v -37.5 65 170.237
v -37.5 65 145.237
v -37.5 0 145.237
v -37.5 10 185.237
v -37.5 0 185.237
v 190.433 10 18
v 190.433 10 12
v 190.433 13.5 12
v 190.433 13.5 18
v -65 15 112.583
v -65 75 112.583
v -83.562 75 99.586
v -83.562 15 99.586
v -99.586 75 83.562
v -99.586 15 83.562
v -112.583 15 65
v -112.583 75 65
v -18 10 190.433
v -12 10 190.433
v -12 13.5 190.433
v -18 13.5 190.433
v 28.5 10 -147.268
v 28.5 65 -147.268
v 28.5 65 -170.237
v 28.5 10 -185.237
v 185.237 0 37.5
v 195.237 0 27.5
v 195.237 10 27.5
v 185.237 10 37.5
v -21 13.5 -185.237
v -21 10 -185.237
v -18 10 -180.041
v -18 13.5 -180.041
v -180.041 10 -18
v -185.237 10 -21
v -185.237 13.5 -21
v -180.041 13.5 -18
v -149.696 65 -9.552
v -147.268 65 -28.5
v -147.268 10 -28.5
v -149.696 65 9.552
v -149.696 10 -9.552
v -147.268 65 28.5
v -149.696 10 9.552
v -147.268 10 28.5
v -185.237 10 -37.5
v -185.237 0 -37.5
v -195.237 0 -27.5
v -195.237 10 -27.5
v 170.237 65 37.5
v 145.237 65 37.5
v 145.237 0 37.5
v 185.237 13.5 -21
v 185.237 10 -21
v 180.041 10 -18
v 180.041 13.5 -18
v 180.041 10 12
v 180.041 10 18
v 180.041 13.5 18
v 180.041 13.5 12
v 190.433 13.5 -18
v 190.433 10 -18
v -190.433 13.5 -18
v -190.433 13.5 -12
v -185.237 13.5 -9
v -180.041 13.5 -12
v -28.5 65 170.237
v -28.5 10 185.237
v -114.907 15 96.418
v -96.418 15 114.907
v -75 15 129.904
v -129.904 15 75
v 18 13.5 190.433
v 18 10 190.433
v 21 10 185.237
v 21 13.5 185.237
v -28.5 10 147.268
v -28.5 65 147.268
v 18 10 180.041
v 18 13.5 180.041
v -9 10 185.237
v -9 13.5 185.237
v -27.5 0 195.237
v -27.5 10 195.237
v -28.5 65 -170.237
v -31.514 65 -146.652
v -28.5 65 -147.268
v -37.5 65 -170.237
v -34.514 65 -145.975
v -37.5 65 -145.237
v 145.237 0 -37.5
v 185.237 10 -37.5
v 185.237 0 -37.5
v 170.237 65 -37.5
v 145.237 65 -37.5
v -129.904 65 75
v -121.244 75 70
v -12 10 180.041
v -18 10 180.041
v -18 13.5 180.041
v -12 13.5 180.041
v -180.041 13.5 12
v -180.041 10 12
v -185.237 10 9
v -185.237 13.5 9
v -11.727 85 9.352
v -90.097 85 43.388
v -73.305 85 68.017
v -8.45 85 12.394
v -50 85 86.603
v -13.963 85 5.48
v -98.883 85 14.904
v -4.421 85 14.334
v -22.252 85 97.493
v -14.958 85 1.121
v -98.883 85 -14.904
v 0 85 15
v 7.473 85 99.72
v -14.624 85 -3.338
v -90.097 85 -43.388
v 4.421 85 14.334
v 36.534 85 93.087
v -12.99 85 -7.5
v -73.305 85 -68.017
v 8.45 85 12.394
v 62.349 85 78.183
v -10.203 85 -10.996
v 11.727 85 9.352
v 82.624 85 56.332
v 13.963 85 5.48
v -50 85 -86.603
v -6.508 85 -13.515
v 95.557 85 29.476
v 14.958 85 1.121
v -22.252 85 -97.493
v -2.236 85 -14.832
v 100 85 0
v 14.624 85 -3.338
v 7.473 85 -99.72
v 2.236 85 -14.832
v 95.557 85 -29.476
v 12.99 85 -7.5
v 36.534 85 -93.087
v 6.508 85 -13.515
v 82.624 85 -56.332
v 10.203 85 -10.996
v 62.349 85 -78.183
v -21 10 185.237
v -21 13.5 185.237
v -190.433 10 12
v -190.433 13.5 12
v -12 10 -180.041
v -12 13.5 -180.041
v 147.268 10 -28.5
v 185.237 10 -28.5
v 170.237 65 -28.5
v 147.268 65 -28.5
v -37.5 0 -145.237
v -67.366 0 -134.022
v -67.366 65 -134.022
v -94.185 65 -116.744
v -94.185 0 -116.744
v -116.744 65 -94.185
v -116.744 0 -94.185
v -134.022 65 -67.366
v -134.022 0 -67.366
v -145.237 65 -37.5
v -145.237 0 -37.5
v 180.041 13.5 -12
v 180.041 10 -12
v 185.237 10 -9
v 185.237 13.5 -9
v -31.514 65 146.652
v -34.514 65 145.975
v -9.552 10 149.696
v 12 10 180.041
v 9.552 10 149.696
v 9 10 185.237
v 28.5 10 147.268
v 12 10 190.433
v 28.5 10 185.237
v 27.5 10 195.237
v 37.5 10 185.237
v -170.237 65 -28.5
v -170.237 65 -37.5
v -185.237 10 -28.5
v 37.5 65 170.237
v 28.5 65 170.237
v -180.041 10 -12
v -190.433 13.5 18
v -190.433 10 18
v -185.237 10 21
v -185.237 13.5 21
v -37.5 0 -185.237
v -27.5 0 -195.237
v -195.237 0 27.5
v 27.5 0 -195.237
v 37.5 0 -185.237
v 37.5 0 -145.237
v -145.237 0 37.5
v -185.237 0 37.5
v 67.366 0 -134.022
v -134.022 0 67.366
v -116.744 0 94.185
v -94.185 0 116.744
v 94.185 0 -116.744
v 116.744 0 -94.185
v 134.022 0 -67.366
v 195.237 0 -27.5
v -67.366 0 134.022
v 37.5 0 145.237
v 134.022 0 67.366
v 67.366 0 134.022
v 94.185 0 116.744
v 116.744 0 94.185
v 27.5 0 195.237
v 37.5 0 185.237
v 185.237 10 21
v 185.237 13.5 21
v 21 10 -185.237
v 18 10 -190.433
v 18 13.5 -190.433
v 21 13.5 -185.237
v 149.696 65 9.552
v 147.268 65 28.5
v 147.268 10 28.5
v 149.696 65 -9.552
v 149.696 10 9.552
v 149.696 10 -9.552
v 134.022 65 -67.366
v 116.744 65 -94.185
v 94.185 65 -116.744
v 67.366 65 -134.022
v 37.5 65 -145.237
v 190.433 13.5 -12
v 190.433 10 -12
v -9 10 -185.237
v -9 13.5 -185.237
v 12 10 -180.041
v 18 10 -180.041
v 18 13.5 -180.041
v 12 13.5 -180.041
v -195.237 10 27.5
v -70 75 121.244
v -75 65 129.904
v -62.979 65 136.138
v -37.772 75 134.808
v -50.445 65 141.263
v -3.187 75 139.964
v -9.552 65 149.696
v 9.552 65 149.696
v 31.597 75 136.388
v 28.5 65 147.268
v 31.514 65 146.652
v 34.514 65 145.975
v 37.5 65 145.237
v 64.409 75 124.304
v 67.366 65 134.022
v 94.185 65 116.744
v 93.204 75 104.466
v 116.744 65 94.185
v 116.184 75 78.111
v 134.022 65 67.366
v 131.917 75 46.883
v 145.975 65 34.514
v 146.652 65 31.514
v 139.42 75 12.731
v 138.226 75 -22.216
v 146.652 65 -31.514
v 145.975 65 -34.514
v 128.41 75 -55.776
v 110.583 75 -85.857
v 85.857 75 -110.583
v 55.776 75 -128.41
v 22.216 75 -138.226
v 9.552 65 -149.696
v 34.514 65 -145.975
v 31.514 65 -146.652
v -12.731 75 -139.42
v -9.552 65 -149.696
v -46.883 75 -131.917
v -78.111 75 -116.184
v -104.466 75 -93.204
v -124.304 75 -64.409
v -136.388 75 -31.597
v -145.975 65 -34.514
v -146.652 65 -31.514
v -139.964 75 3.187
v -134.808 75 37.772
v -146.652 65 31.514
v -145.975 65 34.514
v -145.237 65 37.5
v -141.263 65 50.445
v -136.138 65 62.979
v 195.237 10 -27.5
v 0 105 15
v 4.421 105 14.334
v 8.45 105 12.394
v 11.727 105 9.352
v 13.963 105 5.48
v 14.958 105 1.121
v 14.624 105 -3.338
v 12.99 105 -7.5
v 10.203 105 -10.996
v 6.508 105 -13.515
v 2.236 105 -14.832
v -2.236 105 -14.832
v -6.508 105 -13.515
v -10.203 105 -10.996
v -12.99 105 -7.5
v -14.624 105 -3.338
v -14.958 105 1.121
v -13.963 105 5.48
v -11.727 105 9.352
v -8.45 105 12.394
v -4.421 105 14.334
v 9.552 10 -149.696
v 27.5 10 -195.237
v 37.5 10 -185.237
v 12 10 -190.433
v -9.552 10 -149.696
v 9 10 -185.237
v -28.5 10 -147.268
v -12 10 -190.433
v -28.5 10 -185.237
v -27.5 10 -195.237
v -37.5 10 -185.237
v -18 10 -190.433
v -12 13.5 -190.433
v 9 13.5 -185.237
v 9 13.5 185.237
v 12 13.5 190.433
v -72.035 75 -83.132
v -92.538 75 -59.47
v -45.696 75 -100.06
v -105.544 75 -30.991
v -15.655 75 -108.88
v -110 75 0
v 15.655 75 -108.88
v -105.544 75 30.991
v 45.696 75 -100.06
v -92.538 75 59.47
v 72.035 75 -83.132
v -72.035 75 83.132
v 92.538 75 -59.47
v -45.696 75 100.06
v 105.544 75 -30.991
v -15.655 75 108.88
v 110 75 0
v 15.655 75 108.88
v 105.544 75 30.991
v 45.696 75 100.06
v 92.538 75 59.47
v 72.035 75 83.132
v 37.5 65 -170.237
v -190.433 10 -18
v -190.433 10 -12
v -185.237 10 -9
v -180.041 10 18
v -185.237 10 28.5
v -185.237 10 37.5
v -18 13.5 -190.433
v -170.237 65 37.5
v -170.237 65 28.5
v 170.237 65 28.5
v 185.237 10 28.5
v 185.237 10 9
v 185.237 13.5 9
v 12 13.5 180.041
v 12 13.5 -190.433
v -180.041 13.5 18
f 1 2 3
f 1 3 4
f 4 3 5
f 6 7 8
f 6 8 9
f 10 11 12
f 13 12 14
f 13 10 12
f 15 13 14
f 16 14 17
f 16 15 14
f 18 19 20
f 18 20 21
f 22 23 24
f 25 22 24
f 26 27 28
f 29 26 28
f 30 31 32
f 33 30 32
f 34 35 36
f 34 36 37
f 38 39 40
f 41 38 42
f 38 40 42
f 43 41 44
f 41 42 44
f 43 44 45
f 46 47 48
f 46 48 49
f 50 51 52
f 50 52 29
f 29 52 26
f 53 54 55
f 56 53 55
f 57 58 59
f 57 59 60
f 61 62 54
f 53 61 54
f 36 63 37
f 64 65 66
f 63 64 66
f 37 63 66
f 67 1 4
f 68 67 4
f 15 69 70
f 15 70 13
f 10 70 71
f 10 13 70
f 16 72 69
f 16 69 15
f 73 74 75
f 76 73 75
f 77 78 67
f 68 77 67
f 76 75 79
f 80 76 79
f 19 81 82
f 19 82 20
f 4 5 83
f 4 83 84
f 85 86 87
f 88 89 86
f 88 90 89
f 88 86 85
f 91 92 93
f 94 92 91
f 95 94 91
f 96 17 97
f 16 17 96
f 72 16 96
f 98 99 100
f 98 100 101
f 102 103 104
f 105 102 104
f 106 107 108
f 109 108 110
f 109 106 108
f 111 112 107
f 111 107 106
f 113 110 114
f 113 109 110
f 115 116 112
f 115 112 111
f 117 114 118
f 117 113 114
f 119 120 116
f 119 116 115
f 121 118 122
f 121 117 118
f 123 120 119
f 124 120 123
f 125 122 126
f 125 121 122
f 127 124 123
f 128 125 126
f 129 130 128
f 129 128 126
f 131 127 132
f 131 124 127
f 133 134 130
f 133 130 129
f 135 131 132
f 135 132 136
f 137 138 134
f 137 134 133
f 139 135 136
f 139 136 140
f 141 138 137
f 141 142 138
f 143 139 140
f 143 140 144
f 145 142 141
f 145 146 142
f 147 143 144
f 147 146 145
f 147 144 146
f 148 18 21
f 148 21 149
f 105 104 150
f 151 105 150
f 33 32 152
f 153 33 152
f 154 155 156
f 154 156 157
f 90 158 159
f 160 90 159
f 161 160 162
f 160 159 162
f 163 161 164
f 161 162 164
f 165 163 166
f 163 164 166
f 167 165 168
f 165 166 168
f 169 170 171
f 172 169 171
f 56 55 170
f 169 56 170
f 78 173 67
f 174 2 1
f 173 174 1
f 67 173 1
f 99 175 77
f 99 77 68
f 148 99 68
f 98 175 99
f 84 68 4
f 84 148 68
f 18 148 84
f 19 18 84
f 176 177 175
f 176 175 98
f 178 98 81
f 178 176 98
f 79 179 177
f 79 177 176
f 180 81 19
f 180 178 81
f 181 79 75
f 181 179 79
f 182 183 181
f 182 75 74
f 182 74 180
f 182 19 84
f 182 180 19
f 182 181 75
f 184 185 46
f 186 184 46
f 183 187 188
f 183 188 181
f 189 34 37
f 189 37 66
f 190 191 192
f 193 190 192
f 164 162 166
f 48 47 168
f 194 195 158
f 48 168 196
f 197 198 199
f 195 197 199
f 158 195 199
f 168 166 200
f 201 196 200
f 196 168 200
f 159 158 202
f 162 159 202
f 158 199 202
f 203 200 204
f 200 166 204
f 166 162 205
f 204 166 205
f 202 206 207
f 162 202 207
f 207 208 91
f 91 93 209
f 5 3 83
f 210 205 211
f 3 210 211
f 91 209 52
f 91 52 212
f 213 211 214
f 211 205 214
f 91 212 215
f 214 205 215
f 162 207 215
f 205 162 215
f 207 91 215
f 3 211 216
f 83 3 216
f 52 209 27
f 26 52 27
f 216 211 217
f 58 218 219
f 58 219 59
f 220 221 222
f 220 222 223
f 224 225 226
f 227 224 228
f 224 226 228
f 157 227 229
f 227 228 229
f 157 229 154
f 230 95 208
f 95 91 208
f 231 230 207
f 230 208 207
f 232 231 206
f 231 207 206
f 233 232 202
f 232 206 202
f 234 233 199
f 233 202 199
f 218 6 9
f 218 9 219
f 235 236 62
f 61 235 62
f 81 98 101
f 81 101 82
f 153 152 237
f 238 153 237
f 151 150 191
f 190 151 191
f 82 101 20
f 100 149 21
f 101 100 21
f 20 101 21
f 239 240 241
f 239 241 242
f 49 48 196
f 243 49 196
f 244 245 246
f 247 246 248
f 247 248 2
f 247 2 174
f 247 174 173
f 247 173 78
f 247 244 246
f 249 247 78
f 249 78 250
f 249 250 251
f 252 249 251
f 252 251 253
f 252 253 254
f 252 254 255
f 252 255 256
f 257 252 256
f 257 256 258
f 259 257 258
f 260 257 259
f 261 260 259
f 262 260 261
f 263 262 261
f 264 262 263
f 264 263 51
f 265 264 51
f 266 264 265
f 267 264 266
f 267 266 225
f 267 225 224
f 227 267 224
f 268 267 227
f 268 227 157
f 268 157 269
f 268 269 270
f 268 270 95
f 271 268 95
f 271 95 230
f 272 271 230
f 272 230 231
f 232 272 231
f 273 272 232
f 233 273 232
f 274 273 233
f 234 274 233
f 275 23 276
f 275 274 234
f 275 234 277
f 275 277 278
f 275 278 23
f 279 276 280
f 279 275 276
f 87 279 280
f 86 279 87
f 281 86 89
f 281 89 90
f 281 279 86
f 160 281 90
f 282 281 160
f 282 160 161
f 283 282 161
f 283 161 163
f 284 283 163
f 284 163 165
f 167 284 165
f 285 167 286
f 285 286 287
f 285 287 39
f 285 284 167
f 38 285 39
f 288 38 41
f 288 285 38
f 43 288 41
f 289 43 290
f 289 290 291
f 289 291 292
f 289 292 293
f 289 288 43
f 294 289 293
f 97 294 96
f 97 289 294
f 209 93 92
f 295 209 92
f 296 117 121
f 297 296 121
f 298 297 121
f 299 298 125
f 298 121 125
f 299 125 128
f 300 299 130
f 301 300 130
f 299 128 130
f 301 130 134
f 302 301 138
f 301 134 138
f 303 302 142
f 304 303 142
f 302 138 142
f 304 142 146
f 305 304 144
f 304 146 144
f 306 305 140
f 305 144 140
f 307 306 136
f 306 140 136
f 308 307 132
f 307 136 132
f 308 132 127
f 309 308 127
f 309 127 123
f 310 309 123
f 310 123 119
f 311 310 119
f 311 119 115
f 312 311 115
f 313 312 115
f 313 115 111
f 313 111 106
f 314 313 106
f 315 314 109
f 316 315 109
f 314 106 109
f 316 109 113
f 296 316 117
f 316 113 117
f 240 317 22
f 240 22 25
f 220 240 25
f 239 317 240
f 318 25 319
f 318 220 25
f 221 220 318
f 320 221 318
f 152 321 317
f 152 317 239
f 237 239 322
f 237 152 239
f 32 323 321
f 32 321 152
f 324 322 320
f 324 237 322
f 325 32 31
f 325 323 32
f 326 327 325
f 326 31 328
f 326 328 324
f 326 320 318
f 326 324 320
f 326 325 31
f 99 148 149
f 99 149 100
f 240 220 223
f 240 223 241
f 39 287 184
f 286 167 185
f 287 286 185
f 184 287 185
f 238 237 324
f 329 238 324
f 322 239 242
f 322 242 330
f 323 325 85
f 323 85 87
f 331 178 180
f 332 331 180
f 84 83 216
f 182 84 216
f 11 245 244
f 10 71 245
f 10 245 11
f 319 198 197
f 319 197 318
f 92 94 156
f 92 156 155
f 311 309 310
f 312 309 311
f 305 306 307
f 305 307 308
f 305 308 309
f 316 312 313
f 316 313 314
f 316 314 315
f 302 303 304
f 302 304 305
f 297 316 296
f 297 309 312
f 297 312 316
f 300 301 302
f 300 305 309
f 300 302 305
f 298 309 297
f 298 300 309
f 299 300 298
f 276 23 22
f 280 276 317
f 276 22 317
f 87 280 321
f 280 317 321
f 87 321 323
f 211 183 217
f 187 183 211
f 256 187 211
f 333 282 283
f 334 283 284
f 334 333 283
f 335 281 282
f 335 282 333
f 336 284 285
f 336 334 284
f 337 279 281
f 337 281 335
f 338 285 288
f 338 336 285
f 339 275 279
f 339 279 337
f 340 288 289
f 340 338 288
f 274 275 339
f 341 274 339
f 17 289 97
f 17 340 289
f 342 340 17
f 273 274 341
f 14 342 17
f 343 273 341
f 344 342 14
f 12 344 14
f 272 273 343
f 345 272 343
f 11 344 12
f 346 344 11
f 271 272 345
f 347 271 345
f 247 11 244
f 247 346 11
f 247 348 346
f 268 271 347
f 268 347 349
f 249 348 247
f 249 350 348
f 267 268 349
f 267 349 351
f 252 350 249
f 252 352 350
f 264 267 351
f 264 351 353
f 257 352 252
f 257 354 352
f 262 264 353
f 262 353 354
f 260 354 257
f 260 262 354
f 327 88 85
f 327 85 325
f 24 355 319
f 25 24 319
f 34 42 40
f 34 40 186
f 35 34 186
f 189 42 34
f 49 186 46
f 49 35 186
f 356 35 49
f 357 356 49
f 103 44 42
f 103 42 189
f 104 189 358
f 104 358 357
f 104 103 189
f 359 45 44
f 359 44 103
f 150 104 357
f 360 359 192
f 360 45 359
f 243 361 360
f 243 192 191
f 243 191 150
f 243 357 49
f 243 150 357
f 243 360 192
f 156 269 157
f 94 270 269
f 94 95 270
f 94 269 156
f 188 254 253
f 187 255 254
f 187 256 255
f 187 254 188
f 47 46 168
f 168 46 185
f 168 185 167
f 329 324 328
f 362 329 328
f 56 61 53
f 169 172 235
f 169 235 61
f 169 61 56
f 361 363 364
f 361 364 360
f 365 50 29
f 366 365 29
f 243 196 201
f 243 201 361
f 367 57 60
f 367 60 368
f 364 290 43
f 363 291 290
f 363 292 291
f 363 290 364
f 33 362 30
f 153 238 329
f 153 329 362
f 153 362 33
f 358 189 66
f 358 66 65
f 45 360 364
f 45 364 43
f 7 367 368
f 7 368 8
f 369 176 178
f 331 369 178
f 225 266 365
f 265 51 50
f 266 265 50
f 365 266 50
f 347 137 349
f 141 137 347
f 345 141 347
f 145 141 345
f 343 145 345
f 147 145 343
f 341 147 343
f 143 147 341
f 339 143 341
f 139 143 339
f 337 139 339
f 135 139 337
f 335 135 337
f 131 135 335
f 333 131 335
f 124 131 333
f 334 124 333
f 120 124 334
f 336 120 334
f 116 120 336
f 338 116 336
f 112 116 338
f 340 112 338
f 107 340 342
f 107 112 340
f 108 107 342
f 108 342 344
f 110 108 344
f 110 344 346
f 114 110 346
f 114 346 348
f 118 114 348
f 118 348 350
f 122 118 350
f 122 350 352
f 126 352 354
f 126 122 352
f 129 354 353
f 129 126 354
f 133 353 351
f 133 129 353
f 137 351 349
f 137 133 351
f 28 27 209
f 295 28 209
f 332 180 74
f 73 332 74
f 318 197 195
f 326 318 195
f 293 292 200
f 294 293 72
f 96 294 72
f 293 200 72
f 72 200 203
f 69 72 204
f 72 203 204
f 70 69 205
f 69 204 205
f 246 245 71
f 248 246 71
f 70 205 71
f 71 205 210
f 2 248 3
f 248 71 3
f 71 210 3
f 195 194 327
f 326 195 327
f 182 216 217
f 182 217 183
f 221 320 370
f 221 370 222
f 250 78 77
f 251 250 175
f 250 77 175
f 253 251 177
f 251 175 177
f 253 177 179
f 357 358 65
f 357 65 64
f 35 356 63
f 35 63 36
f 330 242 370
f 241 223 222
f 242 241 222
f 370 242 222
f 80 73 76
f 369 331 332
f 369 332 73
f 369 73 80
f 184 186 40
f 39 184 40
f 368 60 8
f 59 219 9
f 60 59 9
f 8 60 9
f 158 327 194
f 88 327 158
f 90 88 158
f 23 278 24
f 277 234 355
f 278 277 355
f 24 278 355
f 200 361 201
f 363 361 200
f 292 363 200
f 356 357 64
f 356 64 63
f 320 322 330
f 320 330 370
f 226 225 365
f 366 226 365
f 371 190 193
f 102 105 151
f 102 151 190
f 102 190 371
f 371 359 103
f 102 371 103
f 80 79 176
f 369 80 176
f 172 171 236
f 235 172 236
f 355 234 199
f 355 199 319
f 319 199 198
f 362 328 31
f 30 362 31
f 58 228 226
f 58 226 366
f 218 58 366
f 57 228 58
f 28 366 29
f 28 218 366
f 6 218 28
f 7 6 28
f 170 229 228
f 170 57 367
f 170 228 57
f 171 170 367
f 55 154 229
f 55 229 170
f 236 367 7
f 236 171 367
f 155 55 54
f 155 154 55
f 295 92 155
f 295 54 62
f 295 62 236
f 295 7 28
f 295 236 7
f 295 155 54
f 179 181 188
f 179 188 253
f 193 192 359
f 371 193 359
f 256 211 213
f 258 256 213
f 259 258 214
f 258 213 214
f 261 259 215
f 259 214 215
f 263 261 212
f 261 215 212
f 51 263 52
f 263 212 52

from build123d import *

# Parameters (mm, degrees)
SKETCH1_R                    = 150
BOSS_EXTRUDE1_DEPTH          = 75
CHAMFER1_SIZE                = 10
BOSS_EXTRUDE2_START          = -75
SKETCH2_R                    = 150
BOSS_EXTRUDE2_DEPTH          = 10
CHAMFER2_SIZE                = 10
CHAMFER3_SIZE                = 10
BOSS_EXTRUDE3_DEPTH          = 9
BOSS_EXTRUDE4_DEPTH          = 3.5
CIRPATTERN1_COUNT            = 4
CIRPATTERN1_COPY_1_DEPTH     = 9
CIRPATTERN1_COPY_2_DEPTH     = 9
CIRPATTERN1_COPY_3_DEPTH     = 9
CIRPATTERN1_COPY_4_DEPTH     = 3.5
CIRPATTERN1_COPY_5_DEPTH     = 3.5
CIRPATTERN1_COPY_6_DEPTH     = 3.5
CHAMFER2_OF_CIRPATTERN1_SIZE = 10
CHAMFER3_OF_CIRPATTERN1_SIZE = 10
CUT_EXTRUDE1_START           = -60
CUT_EXTRUDE1_DEPTH           = 60
SKETCH7_R                    = 110
BOSS_EXTRUDE5_DEPTH          = 10
BOSS_EXTRUDE5_TAPER          = 45
SKETCH8_R                    = 15
BOSS_EXTRUDE6_DEPTH          = 20


with BuildPart() as part:
    # Sketch1 → Boss-Extrude1 (new body)
    with BuildSketch(Plane(origin=(0, 0, 0), x_dir=(1, 0, 0), z_dir=(0, 1, 0))):
        with Locations(Location((0, 0, 0), (0, 0, 270))):
            Circle(SKETCH1_R)
    extrude(amount=BOSS_EXTRUDE1_DEPTH)

    # Chamfer1
    chamfer1_edges = [part.edges().sort_by_distance(p)[0] for p in [
        (0, 75, -150),
    ]]
    chamfer(chamfer1_edges, length=CHAMFER1_SIZE)

    # Sketch2 → Boss-Extrude2 (add)
    with BuildSketch(Plane(origin=(0, 75, 0), x_dir=(1, 0, 0), z_dir=(0, 1, 0)).offset(BOSS_EXTRUDE2_START)):
        with Locations(Location((0, 0, 0), (0, 0, 165.522487814))):
            Circle(SKETCH2_R)
        with BuildLine():
            Line((-145.236875483, 37.5), (-195.236875483, 37.5))
            Line((-195.236875483, 37.5), (-195.236875483, -37.5))
            Line((-195.236875483, -37.5), (-145.236875483, -37.5))
            ThreePointArc((-145.236875483, -37.5), (-150, 0), (-145.236875483, 37.5))
        make_face()
    boss_extrude2 = extrude(amount=BOSS_EXTRUDE2_DEPTH)

    # Chamfer2
    chamfer2_edges = [part.edges().sort_by_distance(p)[0] for p in [
        (-195.236875483, 5, 37.5),
    ]]
    chamfer(chamfer2_edges, length=CHAMFER2_SIZE)

    # Chamfer3
    chamfer3_edges = [part.edges().sort_by_distance(p)[0] for p in [
        (-195.236875483, 5, -37.5),
    ]]
    chamfer(chamfer3_edges, length=CHAMFER3_SIZE)

    # Sketch3 → Boss-Extrude3 (add)
    with BuildSketch(Plane.XY.offset(37.5)):
        Polygon((-185.236875483, 10), (-145.236875483, 10), (-145.236875483, 65), (-170.236875483, 65), align=None)
    boss_extrude3 = extrude(amount=-BOSS_EXTRUDE3_DEPTH)

    # Sketch4 → Boss-Extrude4 (add)
    with BuildSketch(Plane(origin=(0, 10, 0), x_dir=(1, 0, 0), z_dir=(0, 1, 0))):
        Polygon((-180.04072306, -12), (-185.236875483, -9), (-190.433027905, -12), (-190.433027905, -18), (-185.236875483, -21), (-180.04072306, -18), align=None)
    boss_extrude4 = extrude(amount=BOSS_EXTRUDE4_DEPTH)

    # Mirror1: Boss-Extrude3, Boss-Extrude4 across plane
    add(boss_extrude3.mirror(Plane.XY))
    add(boss_extrude4.mirror(Plane.XY))

    # CirPattern1: Boss-Extrude2, Boss-Extrude3, Boss-Extrude4 ×4 about axis
    cirpattern1_axis = Axis((0, 0, 0), (0, 1, 0))
    add([boss_extrude2.rotate(cirpattern1_axis, i * 360 / CIRPATTERN1_COUNT) for i in range(1, CIRPATTERN1_COUNT)])
    add([boss_extrude3.rotate(cirpattern1_axis, i * 360 / CIRPATTERN1_COUNT) for i in range(1, CIRPATTERN1_COUNT)])
    add([boss_extrude4.rotate(cirpattern1_axis, i * 360 / CIRPATTERN1_COUNT) for i in range(1, CIRPATTERN1_COUNT)])

    # CirPattern1 copy 1 sketch → CirPattern1 copy 1 (add)
    with BuildSketch(Plane(origin=(-37.5, 0, 0), x_dir=(0, 0, -1), z_dir=(-1, 0, 0))):
        Polygon((-185.236875483, -10), (-145.236875483, -10), (-145.236875483, -65), (-170.236875483, -65), align=None)
    extrude(amount=-CIRPATTERN1_COPY_1_DEPTH)

    # CirPattern1 copy 2 sketch → CirPattern1 copy 2 (add)
    with BuildSketch(Plane(origin=(0, 0, 37.5), x_dir=(-1, 0, 0), z_dir=(0, 0, 1))):
        Polygon((-185.236875483, -10), (-145.236875483, -10), (-145.236875483, -65), (-170.236875483, -65), align=None)
    extrude(amount=-CIRPATTERN1_COPY_2_DEPTH)

    # CirPattern1 copy 3 sketch → CirPattern1 copy 3 (add)
    with BuildSketch(Plane(origin=(37.5, 0, 0), x_dir=(0, 0, 1), z_dir=(1, 0, 0))):
        Polygon((-185.236875483, -10), (-145.236875483, -10), (-145.236875483, -65), (-170.236875483, -65), align=None)
    extrude(amount=-CIRPATTERN1_COPY_3_DEPTH)

    # CirPattern1 copy 4 sketch → CirPattern1 copy 4 (add)
    with BuildSketch(Plane(origin=(0, 10, 0), x_dir=(0, 0, -1), z_dir=(0, 1, 0))):
        Polygon((-180.04072306, 12), (-185.236875483, 9), (-190.433027905, 12), (-190.433027905, 18), (-185.236875483, 21), (-180.04072306, 18), align=None)
    extrude(amount=CIRPATTERN1_COPY_4_DEPTH)

    # CirPattern1 copy 5 sketch → CirPattern1 copy 5 (add)
    with BuildSketch(Plane(origin=(0, 10, 0), x_dir=(-1, 0, 0), z_dir=(0, 1, 0))):
        Polygon((-180.04072306, 12), (-185.236875483, 9), (-190.433027905, 12), (-190.433027905, 18), (-185.236875483, 21), (-180.04072306, 18), align=None)
    extrude(amount=CIRPATTERN1_COPY_5_DEPTH)

    # CirPattern1 copy 6 sketch → CirPattern1 copy 6 (add)
    with BuildSketch(Plane.ZX.offset(10)):
        Polygon((-180.04072306, 12), (-185.236875483, 9), (-190.433027905, 12), (-190.433027905, 18), (-185.236875483, 21), (-180.04072306, 18), align=None)
    extrude(amount=CIRPATTERN1_COPY_6_DEPTH)

    # Chamfer2 of CirPattern1
    chamfer2_of_cirpattern1_edges = [part.edges().sort_by_distance(p)[0] for p in [
        (37.5, 5, 195.236875483),
        (195.236875483, 5, -37.5),
        (-37.5, 5, -195.236875483),
    ]]
    chamfer(chamfer2_of_cirpattern1_edges, length=CHAMFER2_OF_CIRPATTERN1_SIZE)

    # Chamfer3 of CirPattern1
    chamfer3_of_cirpattern1_edges = [part.edges().sort_by_distance(p)[0] for p in [
        (-37.5, 5, 195.236875483),
        (195.236875483, 5, 37.5),
        (37.5, 5, -195.236875483),
    ]]
    chamfer(chamfer3_of_cirpattern1_edges, length=CHAMFER3_OF_CIRPATTERN1_SIZE)

    # Sketch5 → Cut-Extrude1 (cut)
    with BuildSketch(Plane(origin=(0, 75, 0), x_dir=(1, 0, 0), z_dir=(0, 1, 0)).offset(CUT_EXTRUDE1_START)):
        with BuildLine():
            ThreePointArc((-70, -121.24355653), (-98.994949366, -98.994949366), (-121.24355653, -70))
            Line((-121.24355653, -70), (-129.903810568, -75))
            ThreePointArc((-129.903810568, -75), (-106.066017178, -106.066017178), (-75, -129.903810568))
            Line((-75, -129.903810568), (-70, -121.24355653))
        make_face()
        with BuildLine():
            ThreePointArc((-65, -112.583302492), (-91.923881554, -91.923881554), (-112.583302492, -65))
            Line((-112.583302492, -65), (-121.24355653, -70))
            ThreePointArc((-121.24355653, -70), (-98.994949366, -98.994949366), (-70, -121.24355653))
            Line((-70, -121.24355653), (-65, -112.583302492))
        make_face()
    extrude(amount=CUT_EXTRUDE1_DEPTH, mode=Mode.SUBTRACT)

    # Sketch7 → Boss-Extrude5 (add)
    with BuildSketch(Plane(origin=(0, 75, 0), x_dir=(1, 0, 0), z_dir=(0, 1, 0))):
        Circle(SKETCH7_R)
    extrude(amount=BOSS_EXTRUDE5_DEPTH, taper=BOSS_EXTRUDE5_TAPER)

    # Sketch8 → Boss-Extrude6 (add)
    with BuildSketch(Plane(origin=(0, 85, 0), x_dir=(1, 0, 0), z_dir=(0, 1, 0))):
        with Locations(Location((0, 0, 0), (0, 0, 270))):
            Circle(SKETCH8_R)
    extrude(amount=BOSS_EXTRUDE6_DEPTH)


solid = part.part
